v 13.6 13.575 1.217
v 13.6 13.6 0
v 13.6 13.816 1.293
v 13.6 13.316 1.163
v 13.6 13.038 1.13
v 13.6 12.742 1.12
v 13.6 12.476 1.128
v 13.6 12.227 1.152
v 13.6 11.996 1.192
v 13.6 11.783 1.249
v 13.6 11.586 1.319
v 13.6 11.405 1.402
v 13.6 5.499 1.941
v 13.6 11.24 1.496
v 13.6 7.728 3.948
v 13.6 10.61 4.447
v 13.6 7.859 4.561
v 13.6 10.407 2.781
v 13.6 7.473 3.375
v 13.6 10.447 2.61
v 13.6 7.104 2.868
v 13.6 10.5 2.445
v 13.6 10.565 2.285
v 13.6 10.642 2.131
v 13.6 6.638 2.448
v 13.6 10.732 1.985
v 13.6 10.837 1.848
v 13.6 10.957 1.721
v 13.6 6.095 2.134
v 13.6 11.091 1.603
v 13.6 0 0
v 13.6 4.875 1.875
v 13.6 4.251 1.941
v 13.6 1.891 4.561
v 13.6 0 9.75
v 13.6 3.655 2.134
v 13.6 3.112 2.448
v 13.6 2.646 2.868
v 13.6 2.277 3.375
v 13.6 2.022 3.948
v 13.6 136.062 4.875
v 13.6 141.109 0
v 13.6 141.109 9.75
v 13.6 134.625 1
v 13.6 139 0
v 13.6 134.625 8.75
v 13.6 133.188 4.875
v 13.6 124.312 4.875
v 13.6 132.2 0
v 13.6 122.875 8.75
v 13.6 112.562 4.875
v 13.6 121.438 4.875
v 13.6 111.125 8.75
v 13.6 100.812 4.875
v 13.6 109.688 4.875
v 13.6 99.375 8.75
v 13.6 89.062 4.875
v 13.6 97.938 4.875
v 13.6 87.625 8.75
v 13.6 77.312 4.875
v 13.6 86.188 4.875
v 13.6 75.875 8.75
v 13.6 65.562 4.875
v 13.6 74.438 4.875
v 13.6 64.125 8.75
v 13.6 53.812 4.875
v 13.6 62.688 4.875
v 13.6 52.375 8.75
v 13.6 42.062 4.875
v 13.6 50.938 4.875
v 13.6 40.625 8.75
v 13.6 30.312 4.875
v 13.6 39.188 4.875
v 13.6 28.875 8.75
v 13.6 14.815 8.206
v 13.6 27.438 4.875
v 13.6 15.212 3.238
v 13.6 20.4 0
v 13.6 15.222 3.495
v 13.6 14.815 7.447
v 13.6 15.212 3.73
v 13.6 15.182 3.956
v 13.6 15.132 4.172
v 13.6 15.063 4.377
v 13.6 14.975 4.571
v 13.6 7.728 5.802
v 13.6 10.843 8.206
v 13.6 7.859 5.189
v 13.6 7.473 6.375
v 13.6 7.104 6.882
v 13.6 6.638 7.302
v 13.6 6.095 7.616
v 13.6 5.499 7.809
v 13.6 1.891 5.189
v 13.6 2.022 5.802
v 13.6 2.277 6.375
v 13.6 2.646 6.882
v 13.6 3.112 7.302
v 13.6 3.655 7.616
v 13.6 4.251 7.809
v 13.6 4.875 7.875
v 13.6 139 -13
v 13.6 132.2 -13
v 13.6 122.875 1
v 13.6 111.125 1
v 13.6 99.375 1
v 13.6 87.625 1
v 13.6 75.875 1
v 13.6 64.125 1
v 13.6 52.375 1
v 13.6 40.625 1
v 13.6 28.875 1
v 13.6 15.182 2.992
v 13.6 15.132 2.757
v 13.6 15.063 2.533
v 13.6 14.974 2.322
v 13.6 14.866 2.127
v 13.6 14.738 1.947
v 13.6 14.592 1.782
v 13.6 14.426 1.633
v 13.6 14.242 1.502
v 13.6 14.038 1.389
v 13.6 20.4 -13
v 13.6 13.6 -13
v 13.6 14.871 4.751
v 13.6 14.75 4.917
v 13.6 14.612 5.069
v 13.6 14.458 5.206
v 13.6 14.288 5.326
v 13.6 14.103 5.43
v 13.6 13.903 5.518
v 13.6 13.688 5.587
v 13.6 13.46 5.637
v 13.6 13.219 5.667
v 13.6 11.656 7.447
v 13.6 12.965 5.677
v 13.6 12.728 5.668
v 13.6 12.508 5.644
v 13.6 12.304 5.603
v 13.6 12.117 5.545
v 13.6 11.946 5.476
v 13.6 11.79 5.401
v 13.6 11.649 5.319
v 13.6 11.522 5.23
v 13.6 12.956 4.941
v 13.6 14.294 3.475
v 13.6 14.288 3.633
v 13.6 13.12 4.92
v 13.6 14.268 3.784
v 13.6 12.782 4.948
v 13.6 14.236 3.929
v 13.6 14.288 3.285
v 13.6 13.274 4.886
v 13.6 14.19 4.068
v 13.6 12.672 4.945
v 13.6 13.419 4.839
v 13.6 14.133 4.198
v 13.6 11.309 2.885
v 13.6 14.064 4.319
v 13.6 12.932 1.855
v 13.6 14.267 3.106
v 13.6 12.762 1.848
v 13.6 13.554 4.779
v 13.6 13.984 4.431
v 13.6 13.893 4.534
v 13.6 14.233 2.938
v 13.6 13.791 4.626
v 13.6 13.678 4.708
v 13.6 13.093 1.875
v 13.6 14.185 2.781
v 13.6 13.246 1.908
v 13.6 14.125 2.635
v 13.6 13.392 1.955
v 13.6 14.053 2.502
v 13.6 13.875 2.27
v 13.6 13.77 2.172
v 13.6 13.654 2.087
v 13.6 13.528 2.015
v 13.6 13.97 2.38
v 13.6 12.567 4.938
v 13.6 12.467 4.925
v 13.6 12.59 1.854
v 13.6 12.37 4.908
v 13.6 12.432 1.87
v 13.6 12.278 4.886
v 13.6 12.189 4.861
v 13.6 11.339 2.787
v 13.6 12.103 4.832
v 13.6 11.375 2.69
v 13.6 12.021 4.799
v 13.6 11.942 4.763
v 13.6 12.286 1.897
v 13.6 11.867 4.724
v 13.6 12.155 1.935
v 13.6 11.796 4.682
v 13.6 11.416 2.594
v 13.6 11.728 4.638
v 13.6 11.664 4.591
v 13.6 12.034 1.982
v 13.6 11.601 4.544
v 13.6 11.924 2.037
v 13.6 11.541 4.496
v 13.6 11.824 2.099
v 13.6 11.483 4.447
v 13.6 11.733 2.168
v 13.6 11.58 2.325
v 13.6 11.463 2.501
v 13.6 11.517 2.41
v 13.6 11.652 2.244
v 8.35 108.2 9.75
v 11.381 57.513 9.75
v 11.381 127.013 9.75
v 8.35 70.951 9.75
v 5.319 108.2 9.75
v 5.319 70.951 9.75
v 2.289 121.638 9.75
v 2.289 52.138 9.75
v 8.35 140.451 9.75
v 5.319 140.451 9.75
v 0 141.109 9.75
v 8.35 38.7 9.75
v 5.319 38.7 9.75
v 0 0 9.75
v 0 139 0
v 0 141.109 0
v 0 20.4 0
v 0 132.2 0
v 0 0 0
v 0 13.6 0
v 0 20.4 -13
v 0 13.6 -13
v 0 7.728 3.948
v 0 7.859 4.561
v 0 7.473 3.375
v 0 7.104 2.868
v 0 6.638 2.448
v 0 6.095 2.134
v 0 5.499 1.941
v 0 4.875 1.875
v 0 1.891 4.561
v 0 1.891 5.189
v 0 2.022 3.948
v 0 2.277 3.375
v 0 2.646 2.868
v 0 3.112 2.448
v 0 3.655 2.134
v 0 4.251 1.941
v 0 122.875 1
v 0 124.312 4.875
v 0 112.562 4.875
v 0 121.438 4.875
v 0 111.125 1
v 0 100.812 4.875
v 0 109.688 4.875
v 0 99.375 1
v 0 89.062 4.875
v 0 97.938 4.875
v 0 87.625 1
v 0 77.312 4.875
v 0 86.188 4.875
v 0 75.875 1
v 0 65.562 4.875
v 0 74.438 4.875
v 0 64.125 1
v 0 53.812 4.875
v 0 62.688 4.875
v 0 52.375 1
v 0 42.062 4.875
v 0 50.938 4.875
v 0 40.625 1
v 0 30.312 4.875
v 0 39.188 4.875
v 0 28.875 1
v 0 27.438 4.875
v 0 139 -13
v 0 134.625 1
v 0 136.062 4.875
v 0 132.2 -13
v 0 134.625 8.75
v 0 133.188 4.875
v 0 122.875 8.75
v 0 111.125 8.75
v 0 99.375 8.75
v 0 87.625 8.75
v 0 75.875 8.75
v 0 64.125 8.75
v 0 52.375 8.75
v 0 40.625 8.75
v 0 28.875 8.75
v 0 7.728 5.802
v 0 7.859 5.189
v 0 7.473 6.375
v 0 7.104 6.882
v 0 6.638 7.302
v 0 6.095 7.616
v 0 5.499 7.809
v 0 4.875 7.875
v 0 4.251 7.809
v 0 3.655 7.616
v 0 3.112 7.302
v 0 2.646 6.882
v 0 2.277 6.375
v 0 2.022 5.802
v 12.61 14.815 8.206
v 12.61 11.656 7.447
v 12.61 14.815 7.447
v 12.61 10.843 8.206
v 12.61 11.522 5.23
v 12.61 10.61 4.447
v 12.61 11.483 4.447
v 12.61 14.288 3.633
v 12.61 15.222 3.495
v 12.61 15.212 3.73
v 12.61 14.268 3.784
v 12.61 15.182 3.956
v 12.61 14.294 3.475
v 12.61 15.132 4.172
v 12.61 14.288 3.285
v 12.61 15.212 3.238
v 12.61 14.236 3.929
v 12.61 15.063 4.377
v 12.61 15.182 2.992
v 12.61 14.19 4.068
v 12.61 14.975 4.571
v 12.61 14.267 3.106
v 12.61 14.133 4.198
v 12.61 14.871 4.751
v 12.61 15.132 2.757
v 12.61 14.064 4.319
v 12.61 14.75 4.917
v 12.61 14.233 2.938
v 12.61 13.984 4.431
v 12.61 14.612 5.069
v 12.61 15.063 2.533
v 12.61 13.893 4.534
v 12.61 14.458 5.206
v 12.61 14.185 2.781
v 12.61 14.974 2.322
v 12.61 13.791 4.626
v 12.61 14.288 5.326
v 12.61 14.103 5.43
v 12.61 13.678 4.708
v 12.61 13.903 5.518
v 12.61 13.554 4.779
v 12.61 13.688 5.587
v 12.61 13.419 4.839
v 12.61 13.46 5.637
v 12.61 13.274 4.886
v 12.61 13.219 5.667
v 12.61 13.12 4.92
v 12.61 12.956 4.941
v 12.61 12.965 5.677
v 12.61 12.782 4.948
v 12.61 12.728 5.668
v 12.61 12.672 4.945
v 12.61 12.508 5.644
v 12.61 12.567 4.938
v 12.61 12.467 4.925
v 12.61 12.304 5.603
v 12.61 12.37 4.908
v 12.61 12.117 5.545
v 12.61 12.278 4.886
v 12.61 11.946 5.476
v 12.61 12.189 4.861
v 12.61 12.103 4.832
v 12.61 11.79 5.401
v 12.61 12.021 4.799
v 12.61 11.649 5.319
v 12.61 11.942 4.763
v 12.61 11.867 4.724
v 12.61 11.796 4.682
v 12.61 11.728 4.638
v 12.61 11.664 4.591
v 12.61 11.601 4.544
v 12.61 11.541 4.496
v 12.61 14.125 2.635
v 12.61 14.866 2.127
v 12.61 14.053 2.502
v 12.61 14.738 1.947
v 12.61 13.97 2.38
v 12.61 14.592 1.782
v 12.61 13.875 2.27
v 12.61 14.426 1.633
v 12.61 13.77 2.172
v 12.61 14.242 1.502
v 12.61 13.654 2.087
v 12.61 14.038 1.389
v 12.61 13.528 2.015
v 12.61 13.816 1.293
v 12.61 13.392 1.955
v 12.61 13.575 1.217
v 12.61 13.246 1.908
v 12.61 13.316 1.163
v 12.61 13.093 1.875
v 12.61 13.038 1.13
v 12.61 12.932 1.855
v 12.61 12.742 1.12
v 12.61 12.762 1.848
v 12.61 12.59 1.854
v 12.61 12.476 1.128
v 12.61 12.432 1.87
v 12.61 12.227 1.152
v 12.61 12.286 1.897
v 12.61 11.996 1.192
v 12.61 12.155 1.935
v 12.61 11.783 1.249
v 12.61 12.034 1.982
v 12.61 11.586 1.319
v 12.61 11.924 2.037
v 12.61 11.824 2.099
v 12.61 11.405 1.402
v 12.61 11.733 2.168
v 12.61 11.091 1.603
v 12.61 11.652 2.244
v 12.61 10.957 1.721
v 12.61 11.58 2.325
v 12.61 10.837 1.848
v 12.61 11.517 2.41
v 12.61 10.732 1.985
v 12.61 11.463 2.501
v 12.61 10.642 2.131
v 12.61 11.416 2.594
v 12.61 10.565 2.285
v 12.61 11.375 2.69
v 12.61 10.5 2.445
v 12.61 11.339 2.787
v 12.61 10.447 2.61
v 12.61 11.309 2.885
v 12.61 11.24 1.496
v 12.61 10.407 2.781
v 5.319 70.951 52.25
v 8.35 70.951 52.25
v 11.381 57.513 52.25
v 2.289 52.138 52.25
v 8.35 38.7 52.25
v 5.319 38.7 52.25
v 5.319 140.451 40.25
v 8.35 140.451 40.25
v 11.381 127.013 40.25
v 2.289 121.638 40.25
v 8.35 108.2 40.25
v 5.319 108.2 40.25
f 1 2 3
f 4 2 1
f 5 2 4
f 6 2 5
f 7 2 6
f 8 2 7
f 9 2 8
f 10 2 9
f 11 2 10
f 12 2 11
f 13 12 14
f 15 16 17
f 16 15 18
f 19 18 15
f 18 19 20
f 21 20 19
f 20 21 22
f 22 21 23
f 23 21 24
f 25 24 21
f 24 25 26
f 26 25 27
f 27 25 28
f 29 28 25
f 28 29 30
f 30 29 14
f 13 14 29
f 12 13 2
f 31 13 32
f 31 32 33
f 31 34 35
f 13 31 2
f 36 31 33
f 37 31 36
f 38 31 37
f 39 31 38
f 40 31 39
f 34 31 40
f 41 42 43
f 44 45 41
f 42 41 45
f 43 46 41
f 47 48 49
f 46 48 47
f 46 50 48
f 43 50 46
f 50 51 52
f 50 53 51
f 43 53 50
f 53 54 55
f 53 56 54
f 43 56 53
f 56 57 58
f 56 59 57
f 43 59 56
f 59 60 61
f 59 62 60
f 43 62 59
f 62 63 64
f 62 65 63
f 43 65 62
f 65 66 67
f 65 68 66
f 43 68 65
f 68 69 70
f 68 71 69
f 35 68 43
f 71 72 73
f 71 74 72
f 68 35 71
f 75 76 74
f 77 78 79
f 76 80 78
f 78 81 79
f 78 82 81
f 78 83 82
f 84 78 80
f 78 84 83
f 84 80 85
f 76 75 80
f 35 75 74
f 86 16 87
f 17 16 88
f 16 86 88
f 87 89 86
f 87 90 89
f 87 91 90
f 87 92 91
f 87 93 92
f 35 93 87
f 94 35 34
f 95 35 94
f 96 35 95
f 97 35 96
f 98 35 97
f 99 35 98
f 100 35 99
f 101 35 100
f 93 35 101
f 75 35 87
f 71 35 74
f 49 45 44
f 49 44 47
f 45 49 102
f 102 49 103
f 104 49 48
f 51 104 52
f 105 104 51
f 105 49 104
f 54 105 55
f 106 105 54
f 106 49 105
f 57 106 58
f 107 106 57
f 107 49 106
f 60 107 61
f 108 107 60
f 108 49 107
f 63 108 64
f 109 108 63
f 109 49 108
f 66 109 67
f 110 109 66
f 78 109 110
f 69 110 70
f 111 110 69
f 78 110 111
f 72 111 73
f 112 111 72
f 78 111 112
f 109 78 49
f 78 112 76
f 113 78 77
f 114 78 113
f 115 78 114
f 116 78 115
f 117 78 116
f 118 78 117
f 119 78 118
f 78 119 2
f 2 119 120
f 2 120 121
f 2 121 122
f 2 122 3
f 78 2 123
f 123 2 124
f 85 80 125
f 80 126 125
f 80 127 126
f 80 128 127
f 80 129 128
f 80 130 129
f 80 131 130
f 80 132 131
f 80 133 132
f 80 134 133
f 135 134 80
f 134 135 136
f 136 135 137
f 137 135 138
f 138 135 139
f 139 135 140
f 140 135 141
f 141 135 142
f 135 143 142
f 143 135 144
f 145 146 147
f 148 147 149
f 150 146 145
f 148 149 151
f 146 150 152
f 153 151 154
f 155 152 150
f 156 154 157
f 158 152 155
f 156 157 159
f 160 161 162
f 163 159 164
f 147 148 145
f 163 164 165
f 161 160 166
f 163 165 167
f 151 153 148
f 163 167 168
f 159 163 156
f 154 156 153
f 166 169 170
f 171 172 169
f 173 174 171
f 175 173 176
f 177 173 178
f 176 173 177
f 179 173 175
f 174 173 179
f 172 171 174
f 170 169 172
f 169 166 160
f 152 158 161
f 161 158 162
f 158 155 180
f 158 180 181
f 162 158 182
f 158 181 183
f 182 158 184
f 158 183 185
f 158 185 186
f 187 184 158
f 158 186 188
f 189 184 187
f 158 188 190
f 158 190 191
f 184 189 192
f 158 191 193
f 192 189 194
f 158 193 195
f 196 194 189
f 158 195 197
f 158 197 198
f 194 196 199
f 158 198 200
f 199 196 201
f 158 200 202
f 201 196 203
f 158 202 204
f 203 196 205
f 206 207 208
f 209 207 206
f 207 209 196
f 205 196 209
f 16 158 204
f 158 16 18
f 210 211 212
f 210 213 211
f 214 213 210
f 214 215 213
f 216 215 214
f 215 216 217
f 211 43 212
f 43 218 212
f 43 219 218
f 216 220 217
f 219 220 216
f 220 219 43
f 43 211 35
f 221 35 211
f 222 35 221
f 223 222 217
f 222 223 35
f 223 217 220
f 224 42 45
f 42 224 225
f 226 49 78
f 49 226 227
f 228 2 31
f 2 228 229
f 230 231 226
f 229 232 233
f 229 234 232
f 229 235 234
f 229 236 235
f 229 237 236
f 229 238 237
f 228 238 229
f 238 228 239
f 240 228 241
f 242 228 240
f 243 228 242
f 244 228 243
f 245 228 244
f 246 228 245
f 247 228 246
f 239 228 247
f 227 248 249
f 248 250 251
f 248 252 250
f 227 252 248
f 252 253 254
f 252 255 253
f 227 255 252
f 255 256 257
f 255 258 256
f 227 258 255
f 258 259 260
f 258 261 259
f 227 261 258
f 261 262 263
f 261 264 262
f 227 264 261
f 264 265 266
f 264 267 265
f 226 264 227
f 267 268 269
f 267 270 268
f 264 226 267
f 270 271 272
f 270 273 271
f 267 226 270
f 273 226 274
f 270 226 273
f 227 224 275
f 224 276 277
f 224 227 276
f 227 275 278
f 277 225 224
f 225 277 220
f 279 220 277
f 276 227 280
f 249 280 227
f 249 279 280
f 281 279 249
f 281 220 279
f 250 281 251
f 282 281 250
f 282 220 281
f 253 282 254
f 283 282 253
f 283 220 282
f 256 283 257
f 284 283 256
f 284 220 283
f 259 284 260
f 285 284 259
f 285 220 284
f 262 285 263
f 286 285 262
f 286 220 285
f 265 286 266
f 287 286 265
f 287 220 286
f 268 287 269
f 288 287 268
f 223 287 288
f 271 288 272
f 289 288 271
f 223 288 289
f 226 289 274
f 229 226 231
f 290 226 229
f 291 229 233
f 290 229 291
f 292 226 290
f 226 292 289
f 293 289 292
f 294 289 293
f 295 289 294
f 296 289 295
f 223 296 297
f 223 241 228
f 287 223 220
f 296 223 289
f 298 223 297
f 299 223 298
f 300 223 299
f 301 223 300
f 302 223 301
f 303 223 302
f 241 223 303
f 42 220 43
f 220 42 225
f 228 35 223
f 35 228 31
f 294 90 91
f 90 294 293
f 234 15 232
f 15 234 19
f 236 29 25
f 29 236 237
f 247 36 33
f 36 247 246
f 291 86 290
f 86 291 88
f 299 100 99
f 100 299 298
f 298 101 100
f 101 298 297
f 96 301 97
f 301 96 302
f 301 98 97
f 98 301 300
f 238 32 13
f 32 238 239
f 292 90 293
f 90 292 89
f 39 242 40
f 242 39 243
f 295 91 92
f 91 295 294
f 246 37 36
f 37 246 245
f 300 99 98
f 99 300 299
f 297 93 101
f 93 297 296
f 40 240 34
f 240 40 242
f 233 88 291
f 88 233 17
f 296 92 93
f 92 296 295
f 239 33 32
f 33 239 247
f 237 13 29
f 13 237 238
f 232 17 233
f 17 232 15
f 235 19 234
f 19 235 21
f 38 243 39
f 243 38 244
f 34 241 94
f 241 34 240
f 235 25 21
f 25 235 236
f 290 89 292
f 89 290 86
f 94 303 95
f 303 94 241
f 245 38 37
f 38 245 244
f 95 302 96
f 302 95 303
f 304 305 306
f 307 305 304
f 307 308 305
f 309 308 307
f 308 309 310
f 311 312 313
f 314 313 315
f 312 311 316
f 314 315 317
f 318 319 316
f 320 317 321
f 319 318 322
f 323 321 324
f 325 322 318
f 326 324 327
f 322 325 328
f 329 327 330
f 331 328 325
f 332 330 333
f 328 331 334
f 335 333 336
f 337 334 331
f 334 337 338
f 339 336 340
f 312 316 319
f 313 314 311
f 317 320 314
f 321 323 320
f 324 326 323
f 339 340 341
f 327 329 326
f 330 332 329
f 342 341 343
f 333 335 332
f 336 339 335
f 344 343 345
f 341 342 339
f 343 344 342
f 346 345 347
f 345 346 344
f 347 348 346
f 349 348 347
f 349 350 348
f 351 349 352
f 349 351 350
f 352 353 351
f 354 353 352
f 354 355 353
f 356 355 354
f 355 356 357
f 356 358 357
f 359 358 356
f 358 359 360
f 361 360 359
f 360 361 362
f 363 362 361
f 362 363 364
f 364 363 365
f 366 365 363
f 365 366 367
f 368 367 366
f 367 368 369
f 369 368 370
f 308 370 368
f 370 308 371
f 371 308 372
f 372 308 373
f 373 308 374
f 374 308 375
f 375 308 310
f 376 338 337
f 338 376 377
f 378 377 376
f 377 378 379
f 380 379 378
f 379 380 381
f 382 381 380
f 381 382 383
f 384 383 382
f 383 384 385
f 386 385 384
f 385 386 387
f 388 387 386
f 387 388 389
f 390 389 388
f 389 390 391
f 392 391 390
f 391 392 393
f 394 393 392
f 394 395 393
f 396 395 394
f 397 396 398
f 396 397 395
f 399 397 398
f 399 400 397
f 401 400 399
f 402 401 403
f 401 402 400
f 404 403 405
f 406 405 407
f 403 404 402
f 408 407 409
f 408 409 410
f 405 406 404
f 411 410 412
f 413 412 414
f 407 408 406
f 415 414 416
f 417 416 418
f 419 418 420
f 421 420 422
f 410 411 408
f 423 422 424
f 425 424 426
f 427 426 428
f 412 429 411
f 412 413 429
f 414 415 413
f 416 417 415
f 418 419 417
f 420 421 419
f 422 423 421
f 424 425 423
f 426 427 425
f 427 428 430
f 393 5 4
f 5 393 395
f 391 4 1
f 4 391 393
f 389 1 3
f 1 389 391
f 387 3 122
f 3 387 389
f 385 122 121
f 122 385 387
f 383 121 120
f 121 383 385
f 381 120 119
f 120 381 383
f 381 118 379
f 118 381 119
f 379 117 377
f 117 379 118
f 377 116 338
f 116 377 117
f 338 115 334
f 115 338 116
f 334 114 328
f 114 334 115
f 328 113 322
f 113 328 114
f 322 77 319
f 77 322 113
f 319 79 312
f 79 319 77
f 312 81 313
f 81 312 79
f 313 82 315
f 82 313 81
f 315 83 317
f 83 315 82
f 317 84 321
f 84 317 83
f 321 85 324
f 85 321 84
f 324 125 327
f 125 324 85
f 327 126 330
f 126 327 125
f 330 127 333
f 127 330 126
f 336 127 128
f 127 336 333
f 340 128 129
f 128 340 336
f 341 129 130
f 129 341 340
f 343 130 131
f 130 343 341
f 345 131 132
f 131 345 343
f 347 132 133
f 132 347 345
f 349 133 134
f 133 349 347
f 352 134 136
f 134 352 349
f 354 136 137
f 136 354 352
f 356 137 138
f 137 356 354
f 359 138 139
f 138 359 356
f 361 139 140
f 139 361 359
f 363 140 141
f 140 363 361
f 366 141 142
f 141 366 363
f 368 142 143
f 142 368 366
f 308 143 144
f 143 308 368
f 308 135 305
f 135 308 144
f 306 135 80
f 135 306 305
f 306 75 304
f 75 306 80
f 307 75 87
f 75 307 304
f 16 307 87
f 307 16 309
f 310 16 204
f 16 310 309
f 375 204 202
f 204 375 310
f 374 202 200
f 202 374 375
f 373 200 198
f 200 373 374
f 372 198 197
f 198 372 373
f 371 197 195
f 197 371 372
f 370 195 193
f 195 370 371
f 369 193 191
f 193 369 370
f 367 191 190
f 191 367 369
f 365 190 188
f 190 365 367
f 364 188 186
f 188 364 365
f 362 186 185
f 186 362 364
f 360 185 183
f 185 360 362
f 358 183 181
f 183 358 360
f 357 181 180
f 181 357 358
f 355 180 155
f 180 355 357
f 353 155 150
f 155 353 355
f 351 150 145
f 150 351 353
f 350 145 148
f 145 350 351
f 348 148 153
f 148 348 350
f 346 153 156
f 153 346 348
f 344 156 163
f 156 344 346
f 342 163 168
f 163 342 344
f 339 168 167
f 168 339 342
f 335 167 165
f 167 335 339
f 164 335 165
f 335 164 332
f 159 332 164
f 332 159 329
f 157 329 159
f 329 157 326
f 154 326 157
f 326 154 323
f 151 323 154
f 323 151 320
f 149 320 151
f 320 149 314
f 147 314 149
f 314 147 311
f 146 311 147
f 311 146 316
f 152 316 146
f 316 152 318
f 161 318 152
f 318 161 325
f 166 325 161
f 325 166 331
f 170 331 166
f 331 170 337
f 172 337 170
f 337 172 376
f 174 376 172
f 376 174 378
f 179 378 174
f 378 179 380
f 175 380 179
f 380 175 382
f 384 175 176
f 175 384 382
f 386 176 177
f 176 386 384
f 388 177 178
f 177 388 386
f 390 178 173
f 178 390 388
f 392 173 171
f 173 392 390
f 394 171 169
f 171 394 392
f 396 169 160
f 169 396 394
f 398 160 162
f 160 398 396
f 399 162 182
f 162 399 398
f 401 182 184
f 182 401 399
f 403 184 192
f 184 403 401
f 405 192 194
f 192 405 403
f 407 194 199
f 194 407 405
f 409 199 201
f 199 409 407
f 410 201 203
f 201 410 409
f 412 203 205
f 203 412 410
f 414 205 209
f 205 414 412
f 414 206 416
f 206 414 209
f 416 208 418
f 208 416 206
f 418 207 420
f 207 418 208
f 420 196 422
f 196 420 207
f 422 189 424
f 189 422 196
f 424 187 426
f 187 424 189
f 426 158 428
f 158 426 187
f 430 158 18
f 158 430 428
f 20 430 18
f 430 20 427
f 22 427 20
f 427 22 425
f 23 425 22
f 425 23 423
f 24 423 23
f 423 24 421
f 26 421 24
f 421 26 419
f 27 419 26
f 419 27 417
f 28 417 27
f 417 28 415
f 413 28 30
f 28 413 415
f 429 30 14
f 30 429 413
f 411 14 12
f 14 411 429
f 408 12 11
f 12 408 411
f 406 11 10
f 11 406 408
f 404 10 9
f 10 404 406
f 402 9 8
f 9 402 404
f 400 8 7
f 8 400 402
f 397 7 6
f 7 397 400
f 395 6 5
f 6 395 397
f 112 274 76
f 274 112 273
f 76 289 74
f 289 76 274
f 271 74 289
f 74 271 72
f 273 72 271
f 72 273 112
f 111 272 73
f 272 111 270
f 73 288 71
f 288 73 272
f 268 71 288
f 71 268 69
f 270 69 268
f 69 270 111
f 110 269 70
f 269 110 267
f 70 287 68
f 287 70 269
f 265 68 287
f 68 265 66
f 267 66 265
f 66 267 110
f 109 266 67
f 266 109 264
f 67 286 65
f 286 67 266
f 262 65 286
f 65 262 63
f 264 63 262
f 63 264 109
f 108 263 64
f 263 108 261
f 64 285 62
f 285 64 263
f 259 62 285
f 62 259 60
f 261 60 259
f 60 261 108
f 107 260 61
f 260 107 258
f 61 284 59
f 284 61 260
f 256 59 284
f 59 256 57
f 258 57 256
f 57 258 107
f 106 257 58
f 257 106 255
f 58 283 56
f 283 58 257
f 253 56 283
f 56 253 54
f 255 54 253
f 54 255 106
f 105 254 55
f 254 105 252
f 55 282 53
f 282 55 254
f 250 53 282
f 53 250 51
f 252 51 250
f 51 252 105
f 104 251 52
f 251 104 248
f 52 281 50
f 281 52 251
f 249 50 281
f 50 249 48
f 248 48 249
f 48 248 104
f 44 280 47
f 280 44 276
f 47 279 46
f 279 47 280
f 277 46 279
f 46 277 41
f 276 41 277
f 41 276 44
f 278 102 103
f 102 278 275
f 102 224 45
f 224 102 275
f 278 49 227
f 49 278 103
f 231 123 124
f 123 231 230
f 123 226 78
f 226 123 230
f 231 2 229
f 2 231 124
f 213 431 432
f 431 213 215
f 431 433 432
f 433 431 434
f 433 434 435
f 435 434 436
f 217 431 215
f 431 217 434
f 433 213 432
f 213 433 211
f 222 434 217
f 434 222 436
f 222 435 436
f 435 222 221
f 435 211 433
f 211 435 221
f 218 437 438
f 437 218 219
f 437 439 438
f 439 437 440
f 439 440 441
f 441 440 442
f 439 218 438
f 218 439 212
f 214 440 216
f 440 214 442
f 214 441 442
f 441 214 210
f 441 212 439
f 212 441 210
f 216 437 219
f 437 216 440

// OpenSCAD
// file: values.scad
$fs=0.1;
//Constants:
edgeRadius=1.5;
underKeyWidth=13.6;
baseHeight=9.75;
genh=5.791666666666667;
a=27.423996629776394;
b=12.370392724366756;
c=12.370392724366756;
d=38.393595281686956;
overhead=65.81759191146335;
keyTravelDistance=13.0;
desiredGamut=24;
shift=3.092598181091689;
holeScale=0.5;
stalkScale=0.48;

Points = [
[shift,a,0],//0
[(b-shift),0,0],//1
[(b+shift),0,0],//2
[(b+c-shift),d,0],//3
[(c+shift),(a+d),0],//4
[(c-shift),(a+d),0],//5
[shift,a,keyTravelDistance],//6
[(b-shift),0,keyTravelDistance],//7
[(b+shift),0,keyTravelDistance],//8
[(b+c-shift),d,keyTravelDistance],//9
[(c+shift),(a+d),keyTravelDistance],//10
[(c-shift),(a+d),keyTravelDistance],//11
];
Faces = [
[0,1,2,3,4,5],
[1,0,6,7],
[2,1,7,8],
[3,2,8,9],
[4,3,9,10],
[5,4,10,11],
[0,5,11,6],
[11,10,9,8,7,6] 
];
// file: keytop.scad
include<values.scad>;
keytop();

module keytopShape(){
polyhedron(Points,Faces);
}
module keytop(){
difference(){
keytopShape();
translate([(b+c)/4,(d+a)/4,-0.1])
scale(holeScale,holeScale,holeScale)
keytopShape();
edge(6,11,1,-1);
edge(6,7,1,1);
edge(7,8,1,1);
edge(8,9,1,1);
edge(9,10,1,-1,-1);
edge(10,11,1,-1);
}
module edge (point1,point2,d1,d2,d3=1){
difference(){
translate([Points[point1][0],Points[point1][1],Points[point1][2]])
rotate([0,90,atan((Points[point2][1]-Points[point1][1])/(Points[point2][0]-Points[point1][0]))])
translate([0,0,d3*30])
rotate(45,0,0)
cube([pow(2*(edgeRadius*edgeRadius),1/2),pow(2*(edgeRadius*edgeRadius),1/2),90],true);
translate([Points[point1][0],Points[point1][1],Points[point1][2]])
rotate([0,90,atan((Points[point2][1]-Points[point1][1])/(Points[point2][0]-Points[point1][0]))])
translate([d1*edgeRadius,d2*edgeRadius,d3*30])
cylinder(90,edgeRadius,edgeRadius, true);
}
}

}
// main file
use<keytop.scad>
include<values.scad>
rotate([0,90,0])5_1();
module 5_1(keytops=false){
length=141.10925857813004;
rotate([0,-90,0]){
//Main Base:
difference(){
cube([underKeyWidth,length,baseHeight],false);
translate([-.1,0.5*baseHeight,0.5*baseHeight])rotate([0,90,0])
cylinder((underKeyWidth+.2),r=3, false);
translate([underKeyWidth-.99,10,0.125*baseHeight])
rotate([90,0,90])
linear_extrude(height=1){
text("5",size=baseHeight*0.75);
}

//Warp Cuts:
translate([-1,0.0+25+0.25*baseHeight,baseHeight-1])
rotate([0,90,0])
linear_extrude(height=underKeyWidth+2)
polygon(points=[[0.5*baseHeight-1,0],[baseHeight-2,0.25*baseHeight-1],[0.5*baseHeight-1,0.5*baseHeight-2],[0,0.25*baseHeight-1]]);
translate([-1,11.75+25+0.25*baseHeight,baseHeight-1])
rotate([0,90,0])
linear_extrude(height=underKeyWidth+2)
polygon(points=[[0.5*baseHeight-1,0],[baseHeight-2,0.25*baseHeight-1],[0.5*baseHeight-1,0.5*baseHeight-2],[0,0.25*baseHeight-1]]);
translate([-1,23.5+25+0.25*baseHeight,baseHeight-1])
rotate([0,90,0])
linear_extrude(height=underKeyWidth+2)
polygon(points=[[0.5*baseHeight-1,0],[baseHeight-2,0.25*baseHeight-1],[0.5*baseHeight-1,0.5*baseHeight-2],[0,0.25*baseHeight-1]]);
translate([-1,35.25+25+0.25*baseHeight,baseHeight-1])
rotate([0,90,0])
linear_extrude(height=underKeyWidth+2)
polygon(points=[[0.5*baseHeight-1,0],[baseHeight-2,0.25*baseHeight-1],[0.5*baseHeight-1,0.5*baseHeight-2],[0,0.25*baseHeight-1]]);
translate([-1,47.0+25+0.25*baseHeight,baseHeight-1])
rotate([0,90,0])
linear_extrude(height=underKeyWidth+2)
polygon(points=[[0.5*baseHeight-1,0],[baseHeight-2,0.25*baseHeight-1],[0.5*baseHeight-1,0.5*baseHeight-2],[0,0.25*baseHeight-1]]);
translate([-1,58.75+25+0.25*baseHeight,baseHeight-1])
rotate([0,90,0])
linear_extrude(height=underKeyWidth+2)
polygon(points=[[0.5*baseHeight-1,0],[baseHeight-2,0.25*baseHeight-1],[0.5*baseHeight-1,0.5*baseHeight-2],[0,0.25*baseHeight-1]]);
translate([-1,70.5+25+0.25*baseHeight,baseHeight-1])
rotate([0,90,0])
linear_extrude(height=underKeyWidth+2)
polygon(points=[[0.5*baseHeight-1,0],[baseHeight-2,0.25*baseHeight-1],[0.5*baseHeight-1,0.5*baseHeight-2],[0,0.25*baseHeight-1]]);
translate([-1,82.25+25+0.25*baseHeight,baseHeight-1])
rotate([0,90,0])
linear_extrude(height=underKeyWidth+2)
polygon(points=[[0.5*baseHeight-1,0],[baseHeight-2,0.25*baseHeight-1],[0.5*baseHeight-1,0.5*baseHeight-2],[0,0.25*baseHeight-1]]);
translate([-1,94.0+25+0.25*baseHeight,baseHeight-1])
rotate([0,90,0])
linear_extrude(height=underKeyWidth+2)
polygon(points=[[0.5*baseHeight-1,0],[baseHeight-2,0.25*baseHeight-1],[0.5*baseHeight-1,0.5*baseHeight-2],[0,0.25*baseHeight-1]]);
translate([-1,105.75+25+0.25*baseHeight,baseHeight-1])
rotate([0,90,0])
linear_extrude(height=underKeyWidth+2)
polygon(points=[[0.5*baseHeight-1,0],[baseHeight-2,0.25*baseHeight-1],[0.5*baseHeight-1,0.5*baseHeight-2],[0,0.25*baseHeight-1]]);
}
//Key Stalks:
translate([shift/4,(genh*1-(d+a)/2+overhead),baseHeight]){
linear_extrude(height=(keyTravelDistance*1.5+desiredGamut-1)){
scale((stalkScale+holeScale)/2,stalkScale)
polygon(points=[
[Points[0][0],Points[0][1]],[Points[1][0],Points[1][1]],[Points[2][0],Points[2][1]],[Points[3][0],Points[3][1]],[Points[4][0],Points[4][1]],[Points[5][0],Points[5][1]],[Points[6][0],Points[6][1]]
]);
}
if(keytops)
translate([0,(-0.5*(a+d)),(keyTravelDistance*1.5+desiredGamut-1+40)])
keytop();
}
translate([shift/4,(genh*13-(d+a)/2+overhead),baseHeight]){
linear_extrude(height=(keyTravelDistance*1.5+desiredGamut-13)){
scale((stalkScale+holeScale)/2,stalkScale)
polygon(points=[
[Points[0][0],Points[0][1]],[Points[1][0],Points[1][1]],[Points[2][0],Points[2][1]],[Points[3][0],Points[3][1]],[Points[4][0],Points[4][1]],[Points[5][0],Points[5][1]],[Points[6][0],Points[6][1]]
]);
}
if(keytops)
translate([0,(-0.5*(a+d)),(keyTravelDistance*1.5+desiredGamut-13+40)])
keytop();
}
//Feet:
difference(){union(){translate([0,132.2,-13.0]){
cube([13.6,6.8,13.0],false);}
translate([0,13.6,-13.0]){
cube([13.6,6.8,13.0],false);}}
}
}}
